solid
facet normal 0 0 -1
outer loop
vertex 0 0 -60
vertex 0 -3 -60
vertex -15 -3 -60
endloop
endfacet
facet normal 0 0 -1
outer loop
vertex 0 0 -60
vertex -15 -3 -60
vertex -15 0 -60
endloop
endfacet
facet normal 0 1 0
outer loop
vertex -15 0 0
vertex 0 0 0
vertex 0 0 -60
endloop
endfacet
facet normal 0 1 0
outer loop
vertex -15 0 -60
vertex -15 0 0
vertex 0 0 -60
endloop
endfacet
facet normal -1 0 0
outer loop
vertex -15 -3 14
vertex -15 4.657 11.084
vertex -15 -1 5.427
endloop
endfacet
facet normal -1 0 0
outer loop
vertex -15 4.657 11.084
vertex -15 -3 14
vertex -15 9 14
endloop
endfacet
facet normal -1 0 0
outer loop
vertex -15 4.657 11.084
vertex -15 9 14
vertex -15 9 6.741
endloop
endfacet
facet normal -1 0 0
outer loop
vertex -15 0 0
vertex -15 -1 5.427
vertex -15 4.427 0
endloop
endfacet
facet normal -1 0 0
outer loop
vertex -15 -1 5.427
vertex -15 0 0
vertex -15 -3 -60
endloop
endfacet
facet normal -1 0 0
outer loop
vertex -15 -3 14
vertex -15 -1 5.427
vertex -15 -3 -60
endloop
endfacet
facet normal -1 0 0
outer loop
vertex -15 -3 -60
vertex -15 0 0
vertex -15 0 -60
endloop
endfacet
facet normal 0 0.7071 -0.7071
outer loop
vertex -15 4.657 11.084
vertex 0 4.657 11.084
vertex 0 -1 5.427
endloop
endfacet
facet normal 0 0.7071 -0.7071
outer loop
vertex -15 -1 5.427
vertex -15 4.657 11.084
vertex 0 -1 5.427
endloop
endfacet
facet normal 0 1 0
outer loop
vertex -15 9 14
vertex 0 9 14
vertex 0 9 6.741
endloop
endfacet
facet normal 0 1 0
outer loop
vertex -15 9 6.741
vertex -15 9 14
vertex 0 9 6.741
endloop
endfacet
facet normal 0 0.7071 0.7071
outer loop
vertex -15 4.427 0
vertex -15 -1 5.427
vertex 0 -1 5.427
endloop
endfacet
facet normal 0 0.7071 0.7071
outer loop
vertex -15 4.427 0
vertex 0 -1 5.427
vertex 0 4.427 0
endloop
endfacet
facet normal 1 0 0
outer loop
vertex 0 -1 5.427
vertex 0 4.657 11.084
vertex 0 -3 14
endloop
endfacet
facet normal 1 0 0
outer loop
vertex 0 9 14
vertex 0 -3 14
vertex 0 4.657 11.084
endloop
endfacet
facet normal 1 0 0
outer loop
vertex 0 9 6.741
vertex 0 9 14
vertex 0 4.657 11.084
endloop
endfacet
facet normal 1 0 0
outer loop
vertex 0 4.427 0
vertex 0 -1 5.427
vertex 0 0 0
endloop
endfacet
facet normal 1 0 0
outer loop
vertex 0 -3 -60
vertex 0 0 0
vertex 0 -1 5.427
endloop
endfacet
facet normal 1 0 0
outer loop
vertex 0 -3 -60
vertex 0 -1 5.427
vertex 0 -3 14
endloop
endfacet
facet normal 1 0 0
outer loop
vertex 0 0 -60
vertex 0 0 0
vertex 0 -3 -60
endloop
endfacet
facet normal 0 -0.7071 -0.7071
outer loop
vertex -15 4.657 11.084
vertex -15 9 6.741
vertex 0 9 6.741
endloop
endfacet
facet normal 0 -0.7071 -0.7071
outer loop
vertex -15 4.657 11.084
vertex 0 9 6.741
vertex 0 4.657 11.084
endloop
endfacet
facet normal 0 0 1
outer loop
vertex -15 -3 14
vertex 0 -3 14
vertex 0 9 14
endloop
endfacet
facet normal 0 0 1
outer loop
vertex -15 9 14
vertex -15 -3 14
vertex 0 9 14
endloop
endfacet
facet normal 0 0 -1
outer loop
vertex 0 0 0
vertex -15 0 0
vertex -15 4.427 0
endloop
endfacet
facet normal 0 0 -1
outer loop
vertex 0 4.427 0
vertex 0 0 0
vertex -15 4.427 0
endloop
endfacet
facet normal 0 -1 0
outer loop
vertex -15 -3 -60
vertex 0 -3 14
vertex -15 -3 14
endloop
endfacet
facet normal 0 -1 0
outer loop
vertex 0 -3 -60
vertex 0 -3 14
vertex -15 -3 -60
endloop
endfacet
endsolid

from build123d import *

# Parameters (mm, degrees)
SKETCH1_W           = 14
SKETCH1_H           = 12
SKETCH1_W_2         = 60
SKETCH1_H_2         = 3
BOSS_EXTRUDE1_DEPTH = 15
CUT_EXTRUDE1_DEPTH  = 63.497999968


with BuildPart() as part:
    # Sketch1 → Boss-Extrude1 (new body)
    with BuildSketch(Plane(origin=(0, 0, 0), x_dir=(0, 0, -1), z_dir=(1, 0, 0))):
        with Locations((-7, 3)):
            Rectangle(SKETCH1_W, SKETCH1_H)
        with Locations((30, -1.5)):
            Rectangle(SKETCH1_W_2, SKETCH1_H_2)
    extrude(amount=-BOSS_EXTRUDE1_DEPTH)

    # Sketch6 → Cut-Extrude1 (cut, through all)
    with BuildSketch(Plane(origin=(0, 0, 0), x_dir=(0, 0, -1), z_dir=(1, 0, 0))):
        Polygon((0, 4.427403812), (0, 9), (-6.741112311, 9), (-11.084258062, 4.656854249), (-5.427403812, -1), align=None)
    extrude(amount=-CUT_EXTRUDE1_DEPTH, mode=Mode.SUBTRACT)


solid = part.part
